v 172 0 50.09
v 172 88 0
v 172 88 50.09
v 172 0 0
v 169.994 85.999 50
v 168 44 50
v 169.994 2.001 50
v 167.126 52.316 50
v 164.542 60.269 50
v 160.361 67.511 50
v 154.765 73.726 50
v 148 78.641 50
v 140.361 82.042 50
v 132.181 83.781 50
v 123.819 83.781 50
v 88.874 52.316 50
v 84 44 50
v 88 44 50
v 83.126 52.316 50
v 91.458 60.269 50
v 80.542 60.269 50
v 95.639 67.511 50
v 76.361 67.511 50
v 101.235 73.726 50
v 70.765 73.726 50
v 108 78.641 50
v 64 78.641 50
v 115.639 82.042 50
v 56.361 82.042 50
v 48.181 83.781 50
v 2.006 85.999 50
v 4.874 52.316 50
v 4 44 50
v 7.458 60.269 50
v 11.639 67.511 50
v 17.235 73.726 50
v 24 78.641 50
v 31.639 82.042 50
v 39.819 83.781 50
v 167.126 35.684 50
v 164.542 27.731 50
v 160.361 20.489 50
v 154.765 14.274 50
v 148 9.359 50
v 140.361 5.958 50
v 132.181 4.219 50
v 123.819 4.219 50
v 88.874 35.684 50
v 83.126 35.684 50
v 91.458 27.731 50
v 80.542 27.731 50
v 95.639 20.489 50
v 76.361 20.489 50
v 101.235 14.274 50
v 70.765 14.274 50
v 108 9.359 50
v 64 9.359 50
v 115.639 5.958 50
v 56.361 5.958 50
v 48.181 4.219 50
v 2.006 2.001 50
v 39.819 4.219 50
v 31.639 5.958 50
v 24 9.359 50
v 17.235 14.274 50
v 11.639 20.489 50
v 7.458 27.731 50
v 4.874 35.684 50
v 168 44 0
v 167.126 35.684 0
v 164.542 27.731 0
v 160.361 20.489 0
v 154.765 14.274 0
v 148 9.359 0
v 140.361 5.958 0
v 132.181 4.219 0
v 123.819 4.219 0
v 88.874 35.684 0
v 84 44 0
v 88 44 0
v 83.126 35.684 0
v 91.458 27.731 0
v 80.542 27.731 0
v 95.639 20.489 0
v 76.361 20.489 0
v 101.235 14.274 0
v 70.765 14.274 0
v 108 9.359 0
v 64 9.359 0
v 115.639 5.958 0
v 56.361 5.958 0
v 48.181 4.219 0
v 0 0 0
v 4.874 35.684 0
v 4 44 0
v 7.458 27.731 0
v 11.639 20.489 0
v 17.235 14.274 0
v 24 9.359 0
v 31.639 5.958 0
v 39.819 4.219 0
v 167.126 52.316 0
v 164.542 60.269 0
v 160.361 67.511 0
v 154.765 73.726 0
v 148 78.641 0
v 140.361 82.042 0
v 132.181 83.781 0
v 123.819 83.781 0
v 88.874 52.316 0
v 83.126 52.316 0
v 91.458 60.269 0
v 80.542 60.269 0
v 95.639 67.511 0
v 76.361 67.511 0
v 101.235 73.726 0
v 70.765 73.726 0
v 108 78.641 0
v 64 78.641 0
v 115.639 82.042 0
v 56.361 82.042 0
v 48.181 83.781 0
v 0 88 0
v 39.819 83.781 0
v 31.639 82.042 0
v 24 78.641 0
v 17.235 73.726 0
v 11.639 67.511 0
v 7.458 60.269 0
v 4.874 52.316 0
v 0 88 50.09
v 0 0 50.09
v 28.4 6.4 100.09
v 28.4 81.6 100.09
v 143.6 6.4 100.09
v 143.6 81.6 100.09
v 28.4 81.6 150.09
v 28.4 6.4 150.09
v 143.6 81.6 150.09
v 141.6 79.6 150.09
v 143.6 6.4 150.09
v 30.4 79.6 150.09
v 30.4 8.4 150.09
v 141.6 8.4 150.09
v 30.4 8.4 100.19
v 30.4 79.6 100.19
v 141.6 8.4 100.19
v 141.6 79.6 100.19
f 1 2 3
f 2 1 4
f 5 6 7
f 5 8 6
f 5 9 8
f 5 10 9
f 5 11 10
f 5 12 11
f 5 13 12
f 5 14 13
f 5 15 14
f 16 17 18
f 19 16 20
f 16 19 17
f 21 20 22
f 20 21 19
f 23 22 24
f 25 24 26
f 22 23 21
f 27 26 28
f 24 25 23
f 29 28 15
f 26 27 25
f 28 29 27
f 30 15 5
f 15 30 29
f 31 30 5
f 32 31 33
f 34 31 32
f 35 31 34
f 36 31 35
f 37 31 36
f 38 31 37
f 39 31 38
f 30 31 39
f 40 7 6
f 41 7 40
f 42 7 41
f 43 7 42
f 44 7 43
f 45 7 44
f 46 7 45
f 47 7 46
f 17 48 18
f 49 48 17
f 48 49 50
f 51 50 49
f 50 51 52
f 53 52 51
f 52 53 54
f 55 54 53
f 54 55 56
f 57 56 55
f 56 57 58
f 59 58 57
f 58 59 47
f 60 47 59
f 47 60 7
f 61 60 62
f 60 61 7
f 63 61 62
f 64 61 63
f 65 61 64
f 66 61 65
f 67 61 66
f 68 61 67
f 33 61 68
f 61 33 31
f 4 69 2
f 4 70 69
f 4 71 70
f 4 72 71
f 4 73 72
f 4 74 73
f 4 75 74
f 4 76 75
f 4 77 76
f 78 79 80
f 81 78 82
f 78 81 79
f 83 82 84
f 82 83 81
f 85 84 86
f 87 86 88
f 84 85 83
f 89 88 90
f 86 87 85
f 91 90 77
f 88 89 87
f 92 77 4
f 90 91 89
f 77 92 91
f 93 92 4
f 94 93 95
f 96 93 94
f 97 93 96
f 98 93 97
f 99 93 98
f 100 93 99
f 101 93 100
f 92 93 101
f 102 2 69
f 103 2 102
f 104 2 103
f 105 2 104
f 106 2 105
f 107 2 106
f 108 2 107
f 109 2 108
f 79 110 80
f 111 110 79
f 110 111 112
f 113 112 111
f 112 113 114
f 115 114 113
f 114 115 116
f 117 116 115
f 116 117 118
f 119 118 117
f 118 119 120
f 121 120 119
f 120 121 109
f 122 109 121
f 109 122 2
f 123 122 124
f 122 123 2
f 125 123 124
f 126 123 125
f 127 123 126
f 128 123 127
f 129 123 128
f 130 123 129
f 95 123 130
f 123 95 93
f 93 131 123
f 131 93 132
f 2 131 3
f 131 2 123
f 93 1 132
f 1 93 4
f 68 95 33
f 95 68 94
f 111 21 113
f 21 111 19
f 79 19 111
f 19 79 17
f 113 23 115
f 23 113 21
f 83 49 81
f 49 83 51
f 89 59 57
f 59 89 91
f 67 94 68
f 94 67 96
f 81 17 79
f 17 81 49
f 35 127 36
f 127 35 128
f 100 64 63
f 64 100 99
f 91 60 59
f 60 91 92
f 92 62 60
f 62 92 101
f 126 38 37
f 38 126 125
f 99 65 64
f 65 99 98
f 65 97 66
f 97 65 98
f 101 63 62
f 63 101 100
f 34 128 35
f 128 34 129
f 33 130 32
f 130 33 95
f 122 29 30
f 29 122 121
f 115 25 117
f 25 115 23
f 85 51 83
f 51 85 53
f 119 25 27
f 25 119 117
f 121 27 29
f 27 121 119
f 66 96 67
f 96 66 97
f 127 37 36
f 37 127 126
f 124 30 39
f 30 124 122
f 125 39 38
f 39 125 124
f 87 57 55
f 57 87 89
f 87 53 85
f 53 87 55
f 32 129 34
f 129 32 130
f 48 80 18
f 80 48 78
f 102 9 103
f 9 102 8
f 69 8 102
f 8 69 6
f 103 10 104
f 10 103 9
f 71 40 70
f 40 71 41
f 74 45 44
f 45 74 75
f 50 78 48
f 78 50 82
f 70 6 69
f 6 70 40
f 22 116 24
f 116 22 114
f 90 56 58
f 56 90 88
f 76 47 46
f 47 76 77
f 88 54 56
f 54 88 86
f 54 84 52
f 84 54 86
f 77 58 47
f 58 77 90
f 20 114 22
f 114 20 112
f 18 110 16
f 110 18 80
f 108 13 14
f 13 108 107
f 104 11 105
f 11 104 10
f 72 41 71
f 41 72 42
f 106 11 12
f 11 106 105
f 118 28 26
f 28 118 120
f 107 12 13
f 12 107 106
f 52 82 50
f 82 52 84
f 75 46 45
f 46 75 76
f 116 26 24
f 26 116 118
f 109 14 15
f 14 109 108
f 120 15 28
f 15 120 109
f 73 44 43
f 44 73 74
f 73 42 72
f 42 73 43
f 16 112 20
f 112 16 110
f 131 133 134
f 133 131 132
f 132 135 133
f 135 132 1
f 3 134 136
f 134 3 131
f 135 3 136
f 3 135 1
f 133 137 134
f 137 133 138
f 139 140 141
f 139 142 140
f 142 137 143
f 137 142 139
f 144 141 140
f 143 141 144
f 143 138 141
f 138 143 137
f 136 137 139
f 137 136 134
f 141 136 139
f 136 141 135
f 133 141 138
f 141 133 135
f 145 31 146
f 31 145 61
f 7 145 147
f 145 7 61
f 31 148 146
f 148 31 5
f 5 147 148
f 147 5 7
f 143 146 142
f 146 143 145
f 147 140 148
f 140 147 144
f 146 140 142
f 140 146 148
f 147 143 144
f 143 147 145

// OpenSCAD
cev = 80;
wcev = 4;
lcev = 50;

profil = [120, 80, 182];
wprofil = 2;

ltrans = 50;

slack = 0.8;

module sqcev (x, y, z, wall) {
  linear_extrude(z)
  difference () {
    square([x, y]);
    
    translate([wall, wall])
    square([x - wall*2, y - wall*2]);
  }
}

module profil () {
  sqcev(profil.x, profil.y, profil.z, wprofil);
}

//profil();

out = [cev * 2 + wcev*3, cev + wcev * 2];

module adapter (reduce) {
  hull () {
    translate([reduce, reduce, reduce == 0 ? 0 : -0.1])
    cube([out.x - 2*reduce, out.y - 2*reduce, 0.1]);
    
    translate([0, 0, reduce == 0 ? 0 : 0.1])
    translate([(out.x - profil.x)/2 + reduce + wprofil + slack/2, (out.y - profil.y)/2 + reduce + wprofil + slack/2, ltrans])
    cube([profil.x - 2*wprofil - 2*reduce - slack, profil.y - 2*wprofil - 2*reduce - slack, 0.1]);
  }
  
  translate([0, 0, ltrans])
  hull () {
    translate([0, 0, reduce == 0 ? 0 : -0.1])
    translate([(out.x - profil.x)/2 + reduce + wprofil + slack/2, (out.y - profil.y)/2 + reduce + wprofil + slack/2, 0])
    cube([profil.x - 2*wprofil - 2*reduce - slack, profil.y - 2*wprofil - 2*reduce - slack, 0.1]);

    translate([0, 0, reduce == 0 ? 0 : 0.1])
    translate([(out.x - profil.x)/2 + reduce + wprofil + slack/2, (out.y - profil.y)/2 + reduce + wprofil + slack/2, lcev])
    cube([profil.x - 2*wprofil - 2*reduce - slack, profil.y - 2*wprofil - 2*reduce - slack, 0.1]);
  }
}  

module cev2 () {
  difference () {
    cube([out.x, out.y, lcev]);
    
    translate([cev/2 + wcev, cev/2 + wcev, -1])
    cylinder(d=cev, h=lcev+2);

    translate([out.x - cev/2 - wcev, cev/2 + wcev, -1])
    cylinder(d=cev, h=lcev+2);
  }
  
  translate([0, 0, lcev - 0.01])
  difference () {
    adapter(0);
    adapter(wprofil);
  }
}

cev2();
